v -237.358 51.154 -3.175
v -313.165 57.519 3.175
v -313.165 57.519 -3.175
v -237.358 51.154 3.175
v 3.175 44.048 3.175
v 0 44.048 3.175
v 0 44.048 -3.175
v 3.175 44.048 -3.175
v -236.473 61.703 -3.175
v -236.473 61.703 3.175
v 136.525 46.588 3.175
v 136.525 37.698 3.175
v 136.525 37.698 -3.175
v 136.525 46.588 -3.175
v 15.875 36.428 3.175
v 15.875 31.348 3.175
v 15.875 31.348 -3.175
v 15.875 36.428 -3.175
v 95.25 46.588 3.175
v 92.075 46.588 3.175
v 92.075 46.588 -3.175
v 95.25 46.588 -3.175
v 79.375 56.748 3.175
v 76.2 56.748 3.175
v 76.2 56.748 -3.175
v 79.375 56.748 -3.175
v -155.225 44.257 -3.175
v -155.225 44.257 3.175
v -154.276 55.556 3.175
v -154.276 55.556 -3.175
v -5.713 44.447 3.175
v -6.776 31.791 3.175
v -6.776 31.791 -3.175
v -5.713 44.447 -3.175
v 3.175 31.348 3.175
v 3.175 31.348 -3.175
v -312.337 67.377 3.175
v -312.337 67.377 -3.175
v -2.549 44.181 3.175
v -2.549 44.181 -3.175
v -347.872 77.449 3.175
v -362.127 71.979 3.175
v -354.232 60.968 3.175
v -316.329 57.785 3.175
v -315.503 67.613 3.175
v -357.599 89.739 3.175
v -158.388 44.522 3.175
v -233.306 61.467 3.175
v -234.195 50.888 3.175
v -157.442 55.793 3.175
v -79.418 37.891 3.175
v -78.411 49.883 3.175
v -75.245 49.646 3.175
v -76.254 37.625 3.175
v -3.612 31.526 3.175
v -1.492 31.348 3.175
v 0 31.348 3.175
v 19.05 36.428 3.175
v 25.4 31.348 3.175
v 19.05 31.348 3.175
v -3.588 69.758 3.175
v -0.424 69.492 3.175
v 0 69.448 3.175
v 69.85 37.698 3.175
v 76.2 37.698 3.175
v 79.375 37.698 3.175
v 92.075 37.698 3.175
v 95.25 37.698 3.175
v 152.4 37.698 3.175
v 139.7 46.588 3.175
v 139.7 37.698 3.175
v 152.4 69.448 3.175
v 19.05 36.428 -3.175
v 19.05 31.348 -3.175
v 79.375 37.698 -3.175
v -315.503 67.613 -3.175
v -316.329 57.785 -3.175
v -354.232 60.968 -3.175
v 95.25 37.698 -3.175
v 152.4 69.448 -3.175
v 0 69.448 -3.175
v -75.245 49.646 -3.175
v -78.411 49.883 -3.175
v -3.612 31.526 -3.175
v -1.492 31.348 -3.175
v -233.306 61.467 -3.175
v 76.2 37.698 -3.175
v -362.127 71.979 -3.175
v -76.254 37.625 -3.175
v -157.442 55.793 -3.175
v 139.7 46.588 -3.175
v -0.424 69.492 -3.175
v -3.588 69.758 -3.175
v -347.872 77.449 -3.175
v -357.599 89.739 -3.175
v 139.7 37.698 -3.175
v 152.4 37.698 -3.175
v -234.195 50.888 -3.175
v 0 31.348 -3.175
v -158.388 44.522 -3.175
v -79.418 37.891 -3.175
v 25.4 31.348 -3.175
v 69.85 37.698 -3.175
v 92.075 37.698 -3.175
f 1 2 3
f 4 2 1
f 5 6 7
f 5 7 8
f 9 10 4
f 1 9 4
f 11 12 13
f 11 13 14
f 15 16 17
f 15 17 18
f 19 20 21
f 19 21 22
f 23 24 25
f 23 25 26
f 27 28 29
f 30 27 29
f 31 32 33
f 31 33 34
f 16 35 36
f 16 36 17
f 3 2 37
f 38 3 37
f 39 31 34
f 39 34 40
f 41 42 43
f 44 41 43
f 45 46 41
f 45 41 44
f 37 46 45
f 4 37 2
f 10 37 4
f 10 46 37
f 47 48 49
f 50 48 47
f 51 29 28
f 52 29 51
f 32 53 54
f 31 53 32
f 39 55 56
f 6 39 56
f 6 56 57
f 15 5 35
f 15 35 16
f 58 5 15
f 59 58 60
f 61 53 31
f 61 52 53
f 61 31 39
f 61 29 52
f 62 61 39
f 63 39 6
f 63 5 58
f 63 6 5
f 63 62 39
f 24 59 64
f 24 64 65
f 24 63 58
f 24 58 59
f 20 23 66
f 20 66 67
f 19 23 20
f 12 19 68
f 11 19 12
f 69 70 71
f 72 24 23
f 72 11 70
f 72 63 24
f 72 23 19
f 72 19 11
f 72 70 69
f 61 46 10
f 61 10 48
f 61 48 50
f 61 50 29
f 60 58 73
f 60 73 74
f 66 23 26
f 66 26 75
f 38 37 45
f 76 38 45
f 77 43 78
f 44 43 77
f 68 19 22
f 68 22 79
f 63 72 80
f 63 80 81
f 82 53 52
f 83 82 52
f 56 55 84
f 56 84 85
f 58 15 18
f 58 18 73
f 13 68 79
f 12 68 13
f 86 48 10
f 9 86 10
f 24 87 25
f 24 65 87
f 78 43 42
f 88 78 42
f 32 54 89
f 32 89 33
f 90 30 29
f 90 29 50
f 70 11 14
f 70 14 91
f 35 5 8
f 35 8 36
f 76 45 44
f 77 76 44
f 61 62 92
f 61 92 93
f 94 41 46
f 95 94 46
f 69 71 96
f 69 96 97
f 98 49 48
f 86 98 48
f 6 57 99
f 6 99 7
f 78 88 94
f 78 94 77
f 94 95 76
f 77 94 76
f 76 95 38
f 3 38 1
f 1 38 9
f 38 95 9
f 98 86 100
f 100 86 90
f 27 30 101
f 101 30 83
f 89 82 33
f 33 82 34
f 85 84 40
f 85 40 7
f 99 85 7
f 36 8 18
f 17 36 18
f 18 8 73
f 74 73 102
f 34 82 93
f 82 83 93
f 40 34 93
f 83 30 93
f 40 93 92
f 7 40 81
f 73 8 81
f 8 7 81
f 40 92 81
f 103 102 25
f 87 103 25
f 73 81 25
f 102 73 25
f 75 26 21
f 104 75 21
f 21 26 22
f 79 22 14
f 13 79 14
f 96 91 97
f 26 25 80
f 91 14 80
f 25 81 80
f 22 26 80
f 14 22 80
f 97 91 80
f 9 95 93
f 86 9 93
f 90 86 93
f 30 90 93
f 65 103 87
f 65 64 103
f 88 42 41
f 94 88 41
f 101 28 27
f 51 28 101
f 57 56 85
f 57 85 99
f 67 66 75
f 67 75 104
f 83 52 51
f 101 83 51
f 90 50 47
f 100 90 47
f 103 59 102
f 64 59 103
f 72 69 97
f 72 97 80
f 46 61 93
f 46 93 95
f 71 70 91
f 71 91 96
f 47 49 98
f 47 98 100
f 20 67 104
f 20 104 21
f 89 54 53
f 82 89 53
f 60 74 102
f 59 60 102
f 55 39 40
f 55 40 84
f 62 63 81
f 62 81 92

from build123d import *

# Parameters (mm, degrees)
BOSS_EXTRUDE1_DEPTH = 3.175
CUT_EXTRUDE1_DEPTH  = 7.35
CUT_EXTRUDE2_DEPTH  = 7.62


with BuildPart() as part:
    # Sketch1 → Boss-Extrude1 (new body, symmetric)
    with BuildSketch(Plane.XY):
        Polygon((76.2, 37.697541537), (76.2, 56.747541537), (79.375, 56.747541537), (79.375, 37.697541537), (92.075, 37.697541537), (92.075, 46.587541537), (95.25, 46.587541537), (95.25, 37.697541537), (136.525, 37.697541537), (136.525, 46.587541537), (139.7, 46.587541537), (139.7, 37.697541537), (152.4, 37.697541537), (152.4, 69.447541537), (0, 69.447541537), (-0.423998633, 69.491926731), (-3.587863461, 69.757603883), (-946.051908629, 122.953392794), (-946.583462345, 116.623288424), (-943.412318182, 116.444298555), (-943.91275138, 110.48479854), (-6.775989292, 31.791225946), (-5.713280681, 44.446685258), (-2.549415853, 44.181008106), (-3.612124464, 31.525548794), (-1.492292584, 31.347541537), (0, 31.347541537), (0, 44.047541537), (3.175, 44.047541537), (3.175, 31.347541537), (15.875, 31.347541537), (15.875, 36.427541537), (19.05, 36.427541537), (19.05, 31.347541537), (25.4, 31.347541537), (69.85, 37.697541537), align=None)
    extrude(amount=BOSS_EXTRUDE1_DEPTH, both=True)

    # Sketch2 → Cut-Extrude1 (cut, through all)
    with BuildSketch(Plane.XY.offset(3.175)):
        Polygon((-76.254460917, 37.625496217), (-75.245037036, 49.646404609), (-78.411328309, 49.883186), (-79.418325745, 37.891173369), align=None)
        Polygon((-155.224527027, 44.256797945), (-154.27566721, 55.556468134), (-157.441958483, 55.793249525), (-158.388391855, 44.522475098), align=None)
        Polygon((-234.194593137, 50.888099674), (-233.306297384, 61.466531659), (-236.472588657, 61.70331305), (-237.358457965, 51.153776826), align=None)
        Polygon((-313.164659247, 57.519401402), (-312.336927558, 67.376595183), (-315.503218831, 67.613376574), (-316.328524075, 57.785078555), align=None)
        Polygon((-392.134725356, 64.15070313), (-391.367557732, 73.286658708), (-394.533849005, 73.523440099), (-395.298590185, 64.416380283), align=None)
        Polygon((-471.104791466, 70.782004859), (-470.398187906, 79.196722233), (-473.564479179, 79.433503624), (-474.268656294, 71.047682011), align=None)
        Polygon((-550.074857576, 77.413306587), (-549.42881808, 85.106785757), (-552.595109353, 85.343567149), (-553.238722404, 77.67898374), align=None)
        Polygon((-629.044923686, 84.044608316), (-628.459448254, 91.016849282), (-631.625739527, 91.253630673), (-632.208788514, 84.310285468), align=None)
        Polygon((-708.014989796, 90.675910044), (-707.490078428, 96.926912807), (-710.656369701, 97.163694198), (-711.178854624, 90.941587197), align=None)
        Polygon((-786.985055905, 97.307211772), (-786.520708602, 102.836976331), (-789.686999875, 103.073757723), (-790.148920734, 97.572888925), align=None)
        Polygon((-865.955122015, 103.938513501), (-865.551338776, 108.747039856), (-868.717630049, 108.983821247), (-869.118986843, 104.204190653), align=None)
    extrude(amount=-CUT_EXTRUDE1_DEPTH, mode=Mode.SUBTRACT)

    # Sketch3 → Cut-Extrude2 (cut)
    with BuildSketch(Plane.XY.offset(3.175)):
        Polygon((-354.231624716, 60.967890842), (-362.126685184, 71.979397876), (-347.872352174, 77.449083798), (-357.599036746, 89.739165772), (-993.791218606, 254.183288708), (-993.791218606, 28.735079887), align=None)
    extrude(amount=-CUT_EXTRUDE2_DEPTH, mode=Mode.SUBTRACT)


solid = part.part
